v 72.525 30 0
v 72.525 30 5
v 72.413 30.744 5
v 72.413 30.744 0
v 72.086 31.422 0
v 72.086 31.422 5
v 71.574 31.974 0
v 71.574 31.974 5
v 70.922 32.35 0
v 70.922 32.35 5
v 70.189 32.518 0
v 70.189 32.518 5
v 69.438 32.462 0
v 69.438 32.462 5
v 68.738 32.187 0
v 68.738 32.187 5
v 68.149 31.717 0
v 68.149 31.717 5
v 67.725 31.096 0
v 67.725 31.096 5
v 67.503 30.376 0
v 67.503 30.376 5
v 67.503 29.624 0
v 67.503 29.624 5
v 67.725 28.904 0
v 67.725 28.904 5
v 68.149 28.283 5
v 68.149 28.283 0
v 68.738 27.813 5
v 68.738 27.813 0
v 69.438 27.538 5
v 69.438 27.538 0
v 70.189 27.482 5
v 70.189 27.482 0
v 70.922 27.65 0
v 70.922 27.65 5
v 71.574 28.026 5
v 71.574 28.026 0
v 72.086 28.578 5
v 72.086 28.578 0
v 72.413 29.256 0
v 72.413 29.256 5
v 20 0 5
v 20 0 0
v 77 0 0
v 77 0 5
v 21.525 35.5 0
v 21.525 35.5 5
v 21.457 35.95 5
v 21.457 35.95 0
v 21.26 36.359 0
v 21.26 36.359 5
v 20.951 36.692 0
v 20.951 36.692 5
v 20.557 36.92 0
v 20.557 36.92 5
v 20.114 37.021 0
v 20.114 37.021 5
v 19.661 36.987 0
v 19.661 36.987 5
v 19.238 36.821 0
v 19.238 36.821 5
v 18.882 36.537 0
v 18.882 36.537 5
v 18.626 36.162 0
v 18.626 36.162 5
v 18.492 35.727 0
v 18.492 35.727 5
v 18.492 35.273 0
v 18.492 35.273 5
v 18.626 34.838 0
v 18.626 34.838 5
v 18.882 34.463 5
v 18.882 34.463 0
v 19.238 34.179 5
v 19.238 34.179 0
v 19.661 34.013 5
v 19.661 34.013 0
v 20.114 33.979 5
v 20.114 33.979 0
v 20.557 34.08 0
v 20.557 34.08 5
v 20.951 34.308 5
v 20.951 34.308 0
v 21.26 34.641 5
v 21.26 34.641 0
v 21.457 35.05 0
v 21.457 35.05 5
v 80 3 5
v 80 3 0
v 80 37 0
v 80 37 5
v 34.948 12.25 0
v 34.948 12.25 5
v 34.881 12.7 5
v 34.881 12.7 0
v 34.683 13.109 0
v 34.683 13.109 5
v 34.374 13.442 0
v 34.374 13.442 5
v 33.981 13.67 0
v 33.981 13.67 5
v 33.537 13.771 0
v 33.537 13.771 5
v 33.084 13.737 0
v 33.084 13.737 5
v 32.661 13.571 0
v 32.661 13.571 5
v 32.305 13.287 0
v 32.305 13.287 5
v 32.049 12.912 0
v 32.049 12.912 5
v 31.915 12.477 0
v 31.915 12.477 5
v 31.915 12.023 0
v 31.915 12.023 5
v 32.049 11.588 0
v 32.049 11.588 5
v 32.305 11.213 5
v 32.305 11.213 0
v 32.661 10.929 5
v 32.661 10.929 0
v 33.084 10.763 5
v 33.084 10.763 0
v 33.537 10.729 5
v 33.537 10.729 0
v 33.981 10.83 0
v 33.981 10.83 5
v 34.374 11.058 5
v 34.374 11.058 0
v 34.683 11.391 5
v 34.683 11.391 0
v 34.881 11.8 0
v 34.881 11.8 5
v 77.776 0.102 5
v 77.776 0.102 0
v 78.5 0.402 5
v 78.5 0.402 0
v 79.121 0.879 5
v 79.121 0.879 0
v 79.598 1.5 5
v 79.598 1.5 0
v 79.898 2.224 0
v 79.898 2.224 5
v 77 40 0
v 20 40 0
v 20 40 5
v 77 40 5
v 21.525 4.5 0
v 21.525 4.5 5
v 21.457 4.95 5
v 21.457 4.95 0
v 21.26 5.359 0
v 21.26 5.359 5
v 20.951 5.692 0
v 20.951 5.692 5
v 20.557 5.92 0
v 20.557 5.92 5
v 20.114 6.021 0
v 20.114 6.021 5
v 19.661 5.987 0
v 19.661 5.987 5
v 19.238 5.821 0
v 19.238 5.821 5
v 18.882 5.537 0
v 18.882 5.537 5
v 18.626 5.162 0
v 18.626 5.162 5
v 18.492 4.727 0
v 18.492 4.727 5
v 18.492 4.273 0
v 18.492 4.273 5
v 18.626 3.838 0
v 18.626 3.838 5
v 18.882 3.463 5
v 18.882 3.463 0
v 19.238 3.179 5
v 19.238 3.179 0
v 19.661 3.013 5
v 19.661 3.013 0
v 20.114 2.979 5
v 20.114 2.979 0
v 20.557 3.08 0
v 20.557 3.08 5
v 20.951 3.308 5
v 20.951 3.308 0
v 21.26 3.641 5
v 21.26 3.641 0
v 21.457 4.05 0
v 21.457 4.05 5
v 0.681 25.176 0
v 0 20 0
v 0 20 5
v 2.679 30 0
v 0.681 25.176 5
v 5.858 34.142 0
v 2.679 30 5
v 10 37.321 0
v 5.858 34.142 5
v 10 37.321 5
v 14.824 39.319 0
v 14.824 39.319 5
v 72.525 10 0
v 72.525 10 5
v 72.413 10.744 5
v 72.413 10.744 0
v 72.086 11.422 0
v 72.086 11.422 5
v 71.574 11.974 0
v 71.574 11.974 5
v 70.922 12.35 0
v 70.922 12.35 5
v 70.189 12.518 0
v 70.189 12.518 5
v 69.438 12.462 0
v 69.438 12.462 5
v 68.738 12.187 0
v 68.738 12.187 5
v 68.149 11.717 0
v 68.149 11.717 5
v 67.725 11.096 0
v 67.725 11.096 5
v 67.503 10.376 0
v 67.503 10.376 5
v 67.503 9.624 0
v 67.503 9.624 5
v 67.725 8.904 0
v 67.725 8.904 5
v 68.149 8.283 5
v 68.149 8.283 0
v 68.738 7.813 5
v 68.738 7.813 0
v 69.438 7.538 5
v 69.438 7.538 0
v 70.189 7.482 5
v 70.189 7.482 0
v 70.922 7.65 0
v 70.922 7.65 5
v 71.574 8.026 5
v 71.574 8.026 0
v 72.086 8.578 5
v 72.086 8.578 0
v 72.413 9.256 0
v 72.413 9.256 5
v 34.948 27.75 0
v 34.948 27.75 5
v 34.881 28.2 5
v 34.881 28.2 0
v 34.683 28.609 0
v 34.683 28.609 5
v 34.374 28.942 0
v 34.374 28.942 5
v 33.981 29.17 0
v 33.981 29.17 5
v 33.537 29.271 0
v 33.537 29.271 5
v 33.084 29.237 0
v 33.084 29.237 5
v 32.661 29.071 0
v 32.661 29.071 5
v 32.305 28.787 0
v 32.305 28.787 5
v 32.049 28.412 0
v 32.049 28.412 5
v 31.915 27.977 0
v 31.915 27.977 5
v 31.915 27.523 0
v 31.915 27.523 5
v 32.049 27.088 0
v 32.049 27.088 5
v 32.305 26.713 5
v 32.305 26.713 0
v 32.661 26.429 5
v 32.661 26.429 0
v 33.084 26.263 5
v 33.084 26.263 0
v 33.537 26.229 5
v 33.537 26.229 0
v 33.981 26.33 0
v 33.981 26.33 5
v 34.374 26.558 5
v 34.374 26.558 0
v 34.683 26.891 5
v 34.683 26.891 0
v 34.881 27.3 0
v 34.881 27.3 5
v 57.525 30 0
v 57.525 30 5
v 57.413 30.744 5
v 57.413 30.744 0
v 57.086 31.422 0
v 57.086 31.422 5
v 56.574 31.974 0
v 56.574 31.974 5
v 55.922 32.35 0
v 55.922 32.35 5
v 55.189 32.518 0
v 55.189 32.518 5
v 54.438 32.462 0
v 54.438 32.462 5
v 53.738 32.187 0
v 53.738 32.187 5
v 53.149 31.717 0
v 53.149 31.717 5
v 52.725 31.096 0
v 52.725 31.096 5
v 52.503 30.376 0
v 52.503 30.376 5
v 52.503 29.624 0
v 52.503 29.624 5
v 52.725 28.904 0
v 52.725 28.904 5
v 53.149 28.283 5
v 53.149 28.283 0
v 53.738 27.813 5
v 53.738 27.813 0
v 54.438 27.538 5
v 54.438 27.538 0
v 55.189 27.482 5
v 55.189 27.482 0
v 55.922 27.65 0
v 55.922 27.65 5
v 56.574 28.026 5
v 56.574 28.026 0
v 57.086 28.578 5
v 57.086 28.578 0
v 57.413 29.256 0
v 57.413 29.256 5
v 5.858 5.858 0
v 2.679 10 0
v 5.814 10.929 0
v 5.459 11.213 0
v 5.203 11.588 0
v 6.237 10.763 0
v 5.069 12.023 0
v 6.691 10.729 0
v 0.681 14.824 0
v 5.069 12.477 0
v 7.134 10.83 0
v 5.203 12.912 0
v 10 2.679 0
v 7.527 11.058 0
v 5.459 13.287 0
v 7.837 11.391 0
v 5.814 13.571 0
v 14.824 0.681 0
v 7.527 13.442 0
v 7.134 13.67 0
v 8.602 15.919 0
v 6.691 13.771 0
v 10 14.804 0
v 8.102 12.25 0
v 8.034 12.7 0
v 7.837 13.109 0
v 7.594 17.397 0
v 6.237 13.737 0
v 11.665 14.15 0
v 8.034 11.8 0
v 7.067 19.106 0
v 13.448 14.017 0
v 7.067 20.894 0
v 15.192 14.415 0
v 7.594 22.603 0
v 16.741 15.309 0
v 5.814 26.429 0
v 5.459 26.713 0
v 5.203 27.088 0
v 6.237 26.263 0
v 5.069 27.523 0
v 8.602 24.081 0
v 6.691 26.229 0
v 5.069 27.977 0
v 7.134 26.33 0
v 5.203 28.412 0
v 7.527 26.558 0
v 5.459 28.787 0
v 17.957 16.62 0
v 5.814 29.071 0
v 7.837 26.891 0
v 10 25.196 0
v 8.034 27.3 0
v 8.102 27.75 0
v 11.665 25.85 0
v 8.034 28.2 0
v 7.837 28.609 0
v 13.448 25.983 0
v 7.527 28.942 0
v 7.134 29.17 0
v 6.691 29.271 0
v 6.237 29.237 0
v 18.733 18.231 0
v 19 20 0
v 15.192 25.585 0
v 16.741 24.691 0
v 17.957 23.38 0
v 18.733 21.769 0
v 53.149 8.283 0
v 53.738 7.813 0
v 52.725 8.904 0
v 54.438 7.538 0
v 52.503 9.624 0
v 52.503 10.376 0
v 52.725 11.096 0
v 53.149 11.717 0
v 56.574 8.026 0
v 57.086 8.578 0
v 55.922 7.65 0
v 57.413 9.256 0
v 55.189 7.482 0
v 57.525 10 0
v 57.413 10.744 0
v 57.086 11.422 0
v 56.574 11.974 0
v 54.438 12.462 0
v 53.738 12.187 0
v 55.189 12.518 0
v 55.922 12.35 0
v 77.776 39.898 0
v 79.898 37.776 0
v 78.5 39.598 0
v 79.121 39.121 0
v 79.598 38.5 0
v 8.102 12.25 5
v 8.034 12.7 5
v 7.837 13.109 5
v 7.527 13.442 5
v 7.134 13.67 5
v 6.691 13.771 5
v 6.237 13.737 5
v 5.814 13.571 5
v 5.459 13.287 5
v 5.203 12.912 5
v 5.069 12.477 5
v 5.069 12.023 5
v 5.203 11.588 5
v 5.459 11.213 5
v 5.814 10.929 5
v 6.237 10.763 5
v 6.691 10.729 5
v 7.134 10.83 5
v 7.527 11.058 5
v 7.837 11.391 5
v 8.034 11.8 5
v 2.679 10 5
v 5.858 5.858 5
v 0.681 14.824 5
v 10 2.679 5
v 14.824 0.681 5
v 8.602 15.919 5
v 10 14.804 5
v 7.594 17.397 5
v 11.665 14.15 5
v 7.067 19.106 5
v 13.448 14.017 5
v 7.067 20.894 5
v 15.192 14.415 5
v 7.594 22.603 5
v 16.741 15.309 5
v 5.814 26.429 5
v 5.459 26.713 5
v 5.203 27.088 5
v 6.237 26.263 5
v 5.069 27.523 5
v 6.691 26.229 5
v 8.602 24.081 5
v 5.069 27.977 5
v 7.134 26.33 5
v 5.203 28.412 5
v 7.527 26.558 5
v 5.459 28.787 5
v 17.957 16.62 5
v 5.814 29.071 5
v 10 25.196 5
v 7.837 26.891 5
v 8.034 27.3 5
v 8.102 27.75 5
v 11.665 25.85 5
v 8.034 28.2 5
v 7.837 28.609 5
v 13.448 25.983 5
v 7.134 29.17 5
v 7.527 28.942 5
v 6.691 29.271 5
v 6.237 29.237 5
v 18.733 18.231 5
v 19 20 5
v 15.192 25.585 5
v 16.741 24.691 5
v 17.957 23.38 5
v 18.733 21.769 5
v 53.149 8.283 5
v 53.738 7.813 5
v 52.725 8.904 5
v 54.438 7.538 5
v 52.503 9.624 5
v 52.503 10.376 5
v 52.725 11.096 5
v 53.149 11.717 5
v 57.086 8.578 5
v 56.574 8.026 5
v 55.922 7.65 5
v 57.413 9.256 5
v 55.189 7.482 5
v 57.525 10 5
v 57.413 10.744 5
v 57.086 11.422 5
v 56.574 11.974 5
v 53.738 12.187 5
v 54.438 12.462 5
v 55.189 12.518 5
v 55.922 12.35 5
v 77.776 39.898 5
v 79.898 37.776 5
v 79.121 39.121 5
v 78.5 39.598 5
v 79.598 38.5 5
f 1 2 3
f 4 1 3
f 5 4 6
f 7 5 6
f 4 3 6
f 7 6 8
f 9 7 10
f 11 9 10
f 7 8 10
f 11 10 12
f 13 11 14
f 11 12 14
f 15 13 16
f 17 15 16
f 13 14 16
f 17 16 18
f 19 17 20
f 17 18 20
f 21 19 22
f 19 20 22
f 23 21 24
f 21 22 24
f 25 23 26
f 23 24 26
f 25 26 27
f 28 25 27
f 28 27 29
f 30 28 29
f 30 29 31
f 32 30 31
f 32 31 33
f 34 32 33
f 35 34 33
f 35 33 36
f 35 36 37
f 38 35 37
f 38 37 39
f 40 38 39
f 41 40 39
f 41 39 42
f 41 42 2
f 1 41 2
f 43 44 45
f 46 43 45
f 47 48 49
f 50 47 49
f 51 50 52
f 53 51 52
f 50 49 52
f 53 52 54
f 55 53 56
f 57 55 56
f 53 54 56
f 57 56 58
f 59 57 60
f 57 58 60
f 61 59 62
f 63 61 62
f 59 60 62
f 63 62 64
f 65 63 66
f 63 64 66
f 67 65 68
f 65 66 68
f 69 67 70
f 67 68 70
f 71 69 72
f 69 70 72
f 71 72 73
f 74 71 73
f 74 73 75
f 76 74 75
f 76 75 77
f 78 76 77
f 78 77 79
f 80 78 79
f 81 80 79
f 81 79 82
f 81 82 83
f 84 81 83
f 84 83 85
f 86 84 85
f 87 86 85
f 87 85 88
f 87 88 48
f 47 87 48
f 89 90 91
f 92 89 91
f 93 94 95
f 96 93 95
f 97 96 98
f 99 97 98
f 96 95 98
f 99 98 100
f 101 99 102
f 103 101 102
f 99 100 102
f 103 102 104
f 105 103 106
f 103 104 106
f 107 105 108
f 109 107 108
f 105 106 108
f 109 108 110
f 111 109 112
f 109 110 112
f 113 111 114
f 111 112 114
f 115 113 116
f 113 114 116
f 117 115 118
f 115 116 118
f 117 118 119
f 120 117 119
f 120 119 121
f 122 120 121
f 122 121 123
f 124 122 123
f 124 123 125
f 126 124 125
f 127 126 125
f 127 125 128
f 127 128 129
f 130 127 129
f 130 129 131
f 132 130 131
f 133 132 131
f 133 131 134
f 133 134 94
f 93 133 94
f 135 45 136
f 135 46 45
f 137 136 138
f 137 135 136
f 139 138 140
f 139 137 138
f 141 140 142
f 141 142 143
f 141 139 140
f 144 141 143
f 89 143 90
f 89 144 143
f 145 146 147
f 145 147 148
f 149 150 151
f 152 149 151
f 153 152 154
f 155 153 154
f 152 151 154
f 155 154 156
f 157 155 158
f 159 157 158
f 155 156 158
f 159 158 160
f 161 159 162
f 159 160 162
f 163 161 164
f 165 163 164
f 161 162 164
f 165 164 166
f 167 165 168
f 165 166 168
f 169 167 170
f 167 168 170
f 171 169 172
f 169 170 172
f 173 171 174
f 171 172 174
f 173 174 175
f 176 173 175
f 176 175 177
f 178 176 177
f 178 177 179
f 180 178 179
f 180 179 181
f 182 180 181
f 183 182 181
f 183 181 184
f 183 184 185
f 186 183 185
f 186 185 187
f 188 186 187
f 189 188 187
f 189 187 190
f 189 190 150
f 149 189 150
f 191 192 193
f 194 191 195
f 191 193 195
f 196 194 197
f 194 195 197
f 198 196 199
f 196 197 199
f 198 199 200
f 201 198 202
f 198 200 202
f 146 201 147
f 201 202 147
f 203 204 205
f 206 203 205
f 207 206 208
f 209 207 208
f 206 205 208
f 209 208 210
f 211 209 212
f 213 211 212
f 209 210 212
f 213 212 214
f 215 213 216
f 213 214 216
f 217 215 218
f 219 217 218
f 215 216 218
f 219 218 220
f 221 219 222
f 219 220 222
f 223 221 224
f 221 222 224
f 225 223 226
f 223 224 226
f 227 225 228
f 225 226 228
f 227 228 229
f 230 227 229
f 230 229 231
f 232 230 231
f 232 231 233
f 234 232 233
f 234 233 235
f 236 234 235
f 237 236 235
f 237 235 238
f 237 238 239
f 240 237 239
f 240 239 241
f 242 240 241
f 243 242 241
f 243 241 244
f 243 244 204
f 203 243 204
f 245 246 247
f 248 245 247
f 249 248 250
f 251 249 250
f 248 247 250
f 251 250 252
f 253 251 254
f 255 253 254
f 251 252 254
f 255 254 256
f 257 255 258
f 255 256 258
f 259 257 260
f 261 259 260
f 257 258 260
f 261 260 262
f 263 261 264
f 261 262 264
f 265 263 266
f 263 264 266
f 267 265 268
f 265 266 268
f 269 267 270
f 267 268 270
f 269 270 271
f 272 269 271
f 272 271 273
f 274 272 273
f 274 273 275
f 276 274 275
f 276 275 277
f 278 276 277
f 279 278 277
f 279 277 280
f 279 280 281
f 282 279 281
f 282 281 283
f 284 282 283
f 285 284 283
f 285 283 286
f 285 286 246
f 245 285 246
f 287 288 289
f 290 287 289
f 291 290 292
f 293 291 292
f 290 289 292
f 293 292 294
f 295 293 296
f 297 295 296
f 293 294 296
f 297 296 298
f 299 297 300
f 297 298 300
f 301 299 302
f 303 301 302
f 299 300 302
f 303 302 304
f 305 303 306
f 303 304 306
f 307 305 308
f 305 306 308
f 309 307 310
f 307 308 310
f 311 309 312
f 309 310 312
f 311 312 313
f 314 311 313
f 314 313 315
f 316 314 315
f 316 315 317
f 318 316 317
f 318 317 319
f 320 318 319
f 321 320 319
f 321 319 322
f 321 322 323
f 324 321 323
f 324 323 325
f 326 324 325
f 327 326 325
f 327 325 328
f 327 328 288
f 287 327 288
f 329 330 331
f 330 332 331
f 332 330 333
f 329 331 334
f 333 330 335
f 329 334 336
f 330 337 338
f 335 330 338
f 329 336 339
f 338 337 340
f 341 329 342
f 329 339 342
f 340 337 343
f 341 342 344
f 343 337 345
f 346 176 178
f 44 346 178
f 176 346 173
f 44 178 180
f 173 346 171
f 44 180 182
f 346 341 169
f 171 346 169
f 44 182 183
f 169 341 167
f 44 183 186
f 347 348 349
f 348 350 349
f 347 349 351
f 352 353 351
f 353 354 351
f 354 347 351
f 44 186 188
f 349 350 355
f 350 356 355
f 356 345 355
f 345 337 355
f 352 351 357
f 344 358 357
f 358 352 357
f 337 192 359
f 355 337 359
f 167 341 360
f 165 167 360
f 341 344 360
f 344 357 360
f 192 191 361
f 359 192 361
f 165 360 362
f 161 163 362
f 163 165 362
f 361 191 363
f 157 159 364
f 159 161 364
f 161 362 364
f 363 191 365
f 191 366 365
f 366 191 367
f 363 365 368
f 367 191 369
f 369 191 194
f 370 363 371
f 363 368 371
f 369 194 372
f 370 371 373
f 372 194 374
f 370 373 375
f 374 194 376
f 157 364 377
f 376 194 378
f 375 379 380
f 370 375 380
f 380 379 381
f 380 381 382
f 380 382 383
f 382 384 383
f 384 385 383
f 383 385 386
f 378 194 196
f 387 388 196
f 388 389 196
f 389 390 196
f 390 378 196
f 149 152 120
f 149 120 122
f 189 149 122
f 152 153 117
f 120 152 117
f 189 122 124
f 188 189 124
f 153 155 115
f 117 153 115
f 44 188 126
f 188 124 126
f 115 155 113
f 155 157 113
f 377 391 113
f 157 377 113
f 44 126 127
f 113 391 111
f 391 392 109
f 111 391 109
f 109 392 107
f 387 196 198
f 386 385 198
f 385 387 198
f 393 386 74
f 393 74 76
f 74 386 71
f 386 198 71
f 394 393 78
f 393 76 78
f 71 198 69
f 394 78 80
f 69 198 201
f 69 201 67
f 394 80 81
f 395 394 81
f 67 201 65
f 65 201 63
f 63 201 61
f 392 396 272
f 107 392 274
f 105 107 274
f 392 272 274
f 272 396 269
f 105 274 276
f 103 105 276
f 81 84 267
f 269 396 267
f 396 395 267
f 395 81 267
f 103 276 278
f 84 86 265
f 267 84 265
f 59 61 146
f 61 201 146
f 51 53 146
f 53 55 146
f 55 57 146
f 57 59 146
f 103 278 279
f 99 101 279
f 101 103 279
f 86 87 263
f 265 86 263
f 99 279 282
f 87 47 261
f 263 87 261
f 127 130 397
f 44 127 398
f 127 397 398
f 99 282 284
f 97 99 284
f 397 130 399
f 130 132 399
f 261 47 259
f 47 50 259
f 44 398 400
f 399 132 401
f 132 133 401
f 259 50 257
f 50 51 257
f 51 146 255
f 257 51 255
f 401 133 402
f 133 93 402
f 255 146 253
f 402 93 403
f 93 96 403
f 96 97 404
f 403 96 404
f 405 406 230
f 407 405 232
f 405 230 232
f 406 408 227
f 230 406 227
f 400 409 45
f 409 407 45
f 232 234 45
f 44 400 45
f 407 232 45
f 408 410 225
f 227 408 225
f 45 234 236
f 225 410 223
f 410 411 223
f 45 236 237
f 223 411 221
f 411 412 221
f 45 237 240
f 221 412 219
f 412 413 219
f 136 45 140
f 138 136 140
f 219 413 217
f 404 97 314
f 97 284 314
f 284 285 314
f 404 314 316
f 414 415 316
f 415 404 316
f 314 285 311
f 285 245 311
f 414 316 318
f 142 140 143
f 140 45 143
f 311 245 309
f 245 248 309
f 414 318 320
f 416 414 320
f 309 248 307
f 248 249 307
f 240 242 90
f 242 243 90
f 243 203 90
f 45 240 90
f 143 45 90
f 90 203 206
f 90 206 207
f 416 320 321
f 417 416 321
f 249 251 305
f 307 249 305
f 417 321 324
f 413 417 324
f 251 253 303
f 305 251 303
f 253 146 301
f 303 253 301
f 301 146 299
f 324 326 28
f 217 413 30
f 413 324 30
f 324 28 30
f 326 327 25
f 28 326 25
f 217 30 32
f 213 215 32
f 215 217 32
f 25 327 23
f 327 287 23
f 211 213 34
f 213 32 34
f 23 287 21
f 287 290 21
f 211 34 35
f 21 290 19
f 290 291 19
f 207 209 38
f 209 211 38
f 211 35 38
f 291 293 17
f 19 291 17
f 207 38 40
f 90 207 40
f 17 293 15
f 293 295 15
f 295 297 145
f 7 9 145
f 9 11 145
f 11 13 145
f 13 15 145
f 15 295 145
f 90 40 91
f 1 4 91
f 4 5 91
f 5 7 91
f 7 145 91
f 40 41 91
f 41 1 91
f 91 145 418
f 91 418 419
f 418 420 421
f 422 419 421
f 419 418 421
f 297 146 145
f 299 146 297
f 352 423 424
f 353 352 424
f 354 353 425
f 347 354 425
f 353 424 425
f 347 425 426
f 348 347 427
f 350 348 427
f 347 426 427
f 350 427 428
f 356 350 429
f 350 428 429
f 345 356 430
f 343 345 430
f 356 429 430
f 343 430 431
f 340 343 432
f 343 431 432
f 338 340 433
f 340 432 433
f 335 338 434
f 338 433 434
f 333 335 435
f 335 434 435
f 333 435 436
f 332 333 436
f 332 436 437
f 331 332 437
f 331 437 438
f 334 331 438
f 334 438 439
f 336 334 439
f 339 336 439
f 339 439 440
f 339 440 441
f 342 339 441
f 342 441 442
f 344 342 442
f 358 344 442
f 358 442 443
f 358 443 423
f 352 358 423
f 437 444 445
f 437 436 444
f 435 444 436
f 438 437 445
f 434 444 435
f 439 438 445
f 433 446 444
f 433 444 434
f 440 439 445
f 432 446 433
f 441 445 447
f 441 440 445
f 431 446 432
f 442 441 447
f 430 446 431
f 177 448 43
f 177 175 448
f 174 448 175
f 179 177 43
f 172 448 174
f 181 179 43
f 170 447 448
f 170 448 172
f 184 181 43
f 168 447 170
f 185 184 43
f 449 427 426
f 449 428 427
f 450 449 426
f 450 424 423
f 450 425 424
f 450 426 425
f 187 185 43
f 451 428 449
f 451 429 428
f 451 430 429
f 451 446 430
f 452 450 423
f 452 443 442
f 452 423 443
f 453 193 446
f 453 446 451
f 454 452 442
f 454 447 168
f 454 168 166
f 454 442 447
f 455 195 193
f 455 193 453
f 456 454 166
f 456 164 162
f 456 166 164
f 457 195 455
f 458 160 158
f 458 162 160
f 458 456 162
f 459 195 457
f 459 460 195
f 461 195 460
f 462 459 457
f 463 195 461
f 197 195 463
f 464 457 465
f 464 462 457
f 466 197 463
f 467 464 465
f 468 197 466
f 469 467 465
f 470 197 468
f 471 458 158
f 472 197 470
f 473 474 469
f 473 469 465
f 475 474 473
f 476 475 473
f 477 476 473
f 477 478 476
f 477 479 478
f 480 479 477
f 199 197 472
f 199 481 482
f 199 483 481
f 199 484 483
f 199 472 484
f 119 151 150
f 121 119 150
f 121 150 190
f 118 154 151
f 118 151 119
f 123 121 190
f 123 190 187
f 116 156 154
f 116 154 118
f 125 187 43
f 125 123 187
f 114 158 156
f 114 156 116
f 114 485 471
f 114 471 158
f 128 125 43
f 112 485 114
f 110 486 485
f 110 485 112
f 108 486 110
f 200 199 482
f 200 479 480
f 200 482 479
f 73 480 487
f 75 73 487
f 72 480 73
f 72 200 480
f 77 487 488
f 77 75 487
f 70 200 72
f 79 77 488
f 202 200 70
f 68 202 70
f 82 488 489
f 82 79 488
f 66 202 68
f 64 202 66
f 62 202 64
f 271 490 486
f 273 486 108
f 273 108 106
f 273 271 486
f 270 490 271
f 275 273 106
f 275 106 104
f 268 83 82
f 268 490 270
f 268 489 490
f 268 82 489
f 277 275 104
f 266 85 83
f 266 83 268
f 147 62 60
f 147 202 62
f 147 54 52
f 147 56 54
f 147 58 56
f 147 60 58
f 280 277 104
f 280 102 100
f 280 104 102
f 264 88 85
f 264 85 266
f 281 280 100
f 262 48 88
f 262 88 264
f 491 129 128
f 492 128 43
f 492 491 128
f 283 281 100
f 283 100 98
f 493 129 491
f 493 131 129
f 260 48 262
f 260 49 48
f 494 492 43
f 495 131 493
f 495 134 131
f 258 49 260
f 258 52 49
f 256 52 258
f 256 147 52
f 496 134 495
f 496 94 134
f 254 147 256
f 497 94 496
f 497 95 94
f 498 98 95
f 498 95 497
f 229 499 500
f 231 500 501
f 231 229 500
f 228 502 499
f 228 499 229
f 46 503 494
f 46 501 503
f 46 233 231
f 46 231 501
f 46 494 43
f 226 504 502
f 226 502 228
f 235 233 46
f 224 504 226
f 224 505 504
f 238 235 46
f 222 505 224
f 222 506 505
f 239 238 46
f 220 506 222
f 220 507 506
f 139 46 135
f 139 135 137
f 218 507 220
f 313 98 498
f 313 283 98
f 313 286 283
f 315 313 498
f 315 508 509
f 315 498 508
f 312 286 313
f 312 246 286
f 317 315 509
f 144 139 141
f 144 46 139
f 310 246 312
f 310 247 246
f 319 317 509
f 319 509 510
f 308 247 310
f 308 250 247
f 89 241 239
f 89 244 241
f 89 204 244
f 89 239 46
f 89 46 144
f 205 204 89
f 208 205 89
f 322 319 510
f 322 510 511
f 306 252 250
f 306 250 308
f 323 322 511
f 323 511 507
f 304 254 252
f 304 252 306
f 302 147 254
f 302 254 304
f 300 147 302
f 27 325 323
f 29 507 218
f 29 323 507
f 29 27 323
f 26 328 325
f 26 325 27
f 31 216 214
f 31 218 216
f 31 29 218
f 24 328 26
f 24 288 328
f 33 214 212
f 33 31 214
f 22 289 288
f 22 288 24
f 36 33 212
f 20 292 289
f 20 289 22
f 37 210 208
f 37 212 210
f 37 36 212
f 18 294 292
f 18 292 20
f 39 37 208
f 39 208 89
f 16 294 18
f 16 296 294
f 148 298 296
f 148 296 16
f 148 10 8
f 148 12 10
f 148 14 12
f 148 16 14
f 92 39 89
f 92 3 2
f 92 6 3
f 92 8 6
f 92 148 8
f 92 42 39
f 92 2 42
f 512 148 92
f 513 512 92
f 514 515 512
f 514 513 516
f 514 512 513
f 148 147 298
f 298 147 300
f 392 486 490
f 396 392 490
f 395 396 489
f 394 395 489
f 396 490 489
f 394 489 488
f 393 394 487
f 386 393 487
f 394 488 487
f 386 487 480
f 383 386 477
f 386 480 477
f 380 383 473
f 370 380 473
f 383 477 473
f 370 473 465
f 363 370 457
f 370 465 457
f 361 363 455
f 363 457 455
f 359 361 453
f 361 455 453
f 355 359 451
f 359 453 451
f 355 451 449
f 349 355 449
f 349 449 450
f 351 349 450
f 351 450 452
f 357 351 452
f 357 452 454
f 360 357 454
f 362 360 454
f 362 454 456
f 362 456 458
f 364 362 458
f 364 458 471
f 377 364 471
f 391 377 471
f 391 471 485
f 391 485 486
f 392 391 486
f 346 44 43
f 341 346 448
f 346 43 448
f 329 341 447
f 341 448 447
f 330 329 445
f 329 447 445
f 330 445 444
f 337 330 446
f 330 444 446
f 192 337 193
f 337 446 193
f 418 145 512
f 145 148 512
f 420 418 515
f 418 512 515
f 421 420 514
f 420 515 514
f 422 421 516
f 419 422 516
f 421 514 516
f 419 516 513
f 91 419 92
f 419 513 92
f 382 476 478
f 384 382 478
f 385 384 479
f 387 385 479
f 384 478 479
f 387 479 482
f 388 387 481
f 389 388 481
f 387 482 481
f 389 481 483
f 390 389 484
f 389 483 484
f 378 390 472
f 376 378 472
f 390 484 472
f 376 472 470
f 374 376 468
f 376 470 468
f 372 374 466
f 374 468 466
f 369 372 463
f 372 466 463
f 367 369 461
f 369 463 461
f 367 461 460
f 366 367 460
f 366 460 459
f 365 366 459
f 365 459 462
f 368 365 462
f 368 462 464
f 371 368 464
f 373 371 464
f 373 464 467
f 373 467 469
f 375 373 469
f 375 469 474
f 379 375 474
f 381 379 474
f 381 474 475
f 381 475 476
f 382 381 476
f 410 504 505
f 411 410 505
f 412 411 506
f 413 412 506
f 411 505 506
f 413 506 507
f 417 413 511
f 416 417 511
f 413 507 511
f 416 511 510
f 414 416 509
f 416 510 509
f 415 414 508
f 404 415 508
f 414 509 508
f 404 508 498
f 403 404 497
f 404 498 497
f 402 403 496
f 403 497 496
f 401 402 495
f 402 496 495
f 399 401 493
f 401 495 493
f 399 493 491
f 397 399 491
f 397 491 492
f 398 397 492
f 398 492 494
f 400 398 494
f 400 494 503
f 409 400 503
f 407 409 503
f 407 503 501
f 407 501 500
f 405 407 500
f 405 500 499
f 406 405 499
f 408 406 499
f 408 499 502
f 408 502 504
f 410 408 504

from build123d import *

# Parameters (mm, degrees)
SKETCH1_W           = 80
SKETCH1_H           = 40
BOSS_EXTRUDE1_DEPTH = 5
CUT_EXTRUDE4_REACH  = 91.582
CUT_EXTRUDE5_REACH  = 91.582
SKETCH11_R          = 2.525
FILLET1_R           = 3
CUT_EXTRUDE9_REACH  = 91.582
SKETCH19_R          = 1.525
SKETCH19_R_2        = 6


with BuildPart() as part:
    # Sketch1 → Boss-Extrude1 (new body)
    with BuildSketch(Plane.XY):
        with Locations((40, 20)):
            Rectangle(SKETCH1_W, SKETCH1_H)
    extrude(amount=BOSS_EXTRUDE1_DEPTH)

    # Sketch10 → Cut-Extrude4 (cut, up to next)
    with BuildSketch(Plane.XY.offset(5), mode=Mode.PRIVATE) as cut_extrude4_sk1:
        with BuildLine():
            ThreePointArc((20, 0), (5.857864376, 5.857864376), (0, 20))
            Line((0, 20), (0, 0))
            Line((0, 0), (20, 0))
        make_face()
    cut_extrude4_tool1 = extrude(cut_extrude4_sk1.sketch, amount=-CUT_EXTRUDE4_REACH, mode=Mode.PRIVATE) & part.part
    # Sketch10 → Cut-Extrude4 (cut, up to next)
    with BuildSketch(Plane.XY.offset(5), mode=Mode.PRIVATE) as cut_extrude4_sk2:
        with BuildLine():
            Line((20, 40), (0, 40))
            Line((0, 40), (0, 20))
            ThreePointArc((0, 20), (5.857864376, 34.142135624), (20, 40))
        make_face()
    cut_extrude4_tool2 = extrude(cut_extrude4_sk2.sketch, amount=-CUT_EXTRUDE4_REACH, mode=Mode.PRIVATE) & part.part
    add(cut_extrude4_tool1.solids().sort_by_distance((4.467359, 4.467359, 5))[0], mode=Mode.SUBTRACT)
    add(cut_extrude4_tool2.solids().sort_by_distance((4.467359, 35.532641, 5))[0], mode=Mode.SUBTRACT)

    # Sketch11 → Cut-Extrude5 (cut, up to next)
    with BuildSketch(Plane.XY.offset(5), mode=Mode.PRIVATE) as cut_extrude5_sk1:
        with Locations((55, 30)):
            Circle(SKETCH11_R)
    cut_extrude5_tool1 = extrude(cut_extrude5_sk1.sketch, amount=-CUT_EXTRUDE5_REACH, mode=Mode.PRIVATE) & part.part
    # Sketch11 → Cut-Extrude5 (cut, up to next)
    with BuildSketch(Plane.XY.offset(5), mode=Mode.PRIVATE) as cut_extrude5_sk2:
        with Locations((70, 30)):
            Circle(SKETCH11_R)
    cut_extrude5_tool2 = extrude(cut_extrude5_sk2.sketch, amount=-CUT_EXTRUDE5_REACH, mode=Mode.PRIVATE) & part.part
    # Sketch11 → Cut-Extrude5 (cut, up to next)
    with BuildSketch(Plane.XY.offset(5), mode=Mode.PRIVATE) as cut_extrude5_sk3:
        with Locations((55, 10)):
            Circle(SKETCH11_R)
    cut_extrude5_tool3 = extrude(cut_extrude5_sk3.sketch, amount=-CUT_EXTRUDE5_REACH, mode=Mode.PRIVATE) & part.part
    # Sketch11 → Cut-Extrude5 (cut, up to next)
    with BuildSketch(Plane.XY.offset(5), mode=Mode.PRIVATE) as cut_extrude5_sk4:
        with Locations((70, 10)):
            Circle(SKETCH11_R)
    cut_extrude5_tool4 = extrude(cut_extrude5_sk4.sketch, amount=-CUT_EXTRUDE5_REACH, mode=Mode.PRIVATE) & part.part
    add(cut_extrude5_tool1.solids().sort_by_distance((55, 30, 5))[0], mode=Mode.SUBTRACT)
    add(cut_extrude5_tool2.solids().sort_by_distance((70, 30, 5))[0], mode=Mode.SUBTRACT)
    add(cut_extrude5_tool3.solids().sort_by_distance((55, 10, 5))[0], mode=Mode.SUBTRACT)
    add(cut_extrude5_tool4.solids().sort_by_distance((70, 10, 5))[0], mode=Mode.SUBTRACT)

    # Fillet1
    fillet1_edges = [part.edges().sort_by_distance(p)[0] for p in [
        (80, 40, 2.5),
        (80, 0, 2.5),
    ]]
    fillet(fillet1_edges, radius=FILLET1_R)

    # Sketch19 → Cut-Extrude9 (cut, up to next)
    with BuildSketch(Plane.XY.offset(5), mode=Mode.PRIVATE) as cut_extrude9_sk1:
        with Locations((20, 35.5)):
            Circle(SKETCH19_R)
    cut_extrude9_tool1 = extrude(cut_extrude9_sk1.sketch, amount=-CUT_EXTRUDE9_REACH, mode=Mode.PRIVATE) & part.part
    # Sketch19 → Cut-Extrude9 (cut, up to next)
    with BuildSketch(Plane.XY.offset(5), mode=Mode.PRIVATE) as cut_extrude9_sk2:
        with Locations((33.423393759, 27.75)):
            Circle(SKETCH19_R)
    cut_extrude9_tool2 = extrude(cut_extrude9_sk2.sketch, amount=-CUT_EXTRUDE9_REACH, mode=Mode.PRIVATE) & part.part
    # Sketch19 → Cut-Extrude9 (cut, up to next)
    with BuildSketch(Plane.XY.offset(5), mode=Mode.PRIVATE) as cut_extrude9_sk3:
        with Locations((33.423393759, 12.25)):
            Circle(SKETCH19_R)
    cut_extrude9_tool3 = extrude(cut_extrude9_sk3.sketch, amount=-CUT_EXTRUDE9_REACH, mode=Mode.PRIVATE) & part.part
    # Sketch19 → Cut-Extrude9 (cut, up to next)
    with BuildSketch(Plane.XY.offset(5), mode=Mode.PRIVATE) as cut_extrude9_sk4:
        with Locations((20, 4.5)):
            Circle(SKETCH19_R)
    cut_extrude9_tool4 = extrude(cut_extrude9_sk4.sketch, amount=-CUT_EXTRUDE9_REACH, mode=Mode.PRIVATE) & part.part
    # Sketch19 → Cut-Extrude9 (cut, up to next)
    with BuildSketch(Plane.XY.offset(5), mode=Mode.PRIVATE) as cut_extrude9_sk5:
        with Locations((6.576606241, 12.25)):
            Circle(SKETCH19_R)
    cut_extrude9_tool5 = extrude(cut_extrude9_sk5.sketch, amount=-CUT_EXTRUDE9_REACH, mode=Mode.PRIVATE) & part.part
    # Sketch19 → Cut-Extrude9 (cut, up to next)
    with BuildSketch(Plane.XY.offset(5), mode=Mode.PRIVATE) as cut_extrude9_sk6:
        with Locations((6.576606241, 27.75)):
            Circle(SKETCH19_R)
    cut_extrude9_tool6 = extrude(cut_extrude9_sk6.sketch, amount=-CUT_EXTRUDE9_REACH, mode=Mode.PRIVATE) & part.part
    # Sketch19 → Cut-Extrude9 (cut, up to next)
    with BuildSketch(Plane.XY.offset(5), mode=Mode.PRIVATE) as cut_extrude9_sk7:
        with Locations((13, 20)):
            Circle(SKETCH19_R_2)
    cut_extrude9_tool7 = extrude(cut_extrude9_sk7.sketch, amount=-CUT_EXTRUDE9_REACH, mode=Mode.PRIVATE) & part.part
    add(cut_extrude9_tool1.solids().sort_by_distance((20, 35.5, 5))[0], mode=Mode.SUBTRACT)
    add(cut_extrude9_tool2.solids().sort_by_distance((33.423394, 27.75, 5))[0], mode=Mode.SUBTRACT)
    add(cut_extrude9_tool3.solids().sort_by_distance((33.423394, 12.25, 5))[0], mode=Mode.SUBTRACT)
    add(cut_extrude9_tool4.solids().sort_by_distance((20, 4.5, 5))[0], mode=Mode.SUBTRACT)
    add(cut_extrude9_tool5.solids().sort_by_distance((6.576606, 12.25, 5))[0], mode=Mode.SUBTRACT)
    add(cut_extrude9_tool6.solids().sort_by_distance((6.576606, 27.75, 5))[0], mode=Mode.SUBTRACT)
    add(cut_extrude9_tool7.solids().sort_by_distance((13, 20, 5))[0], mode=Mode.SUBTRACT)


solid = part.part
